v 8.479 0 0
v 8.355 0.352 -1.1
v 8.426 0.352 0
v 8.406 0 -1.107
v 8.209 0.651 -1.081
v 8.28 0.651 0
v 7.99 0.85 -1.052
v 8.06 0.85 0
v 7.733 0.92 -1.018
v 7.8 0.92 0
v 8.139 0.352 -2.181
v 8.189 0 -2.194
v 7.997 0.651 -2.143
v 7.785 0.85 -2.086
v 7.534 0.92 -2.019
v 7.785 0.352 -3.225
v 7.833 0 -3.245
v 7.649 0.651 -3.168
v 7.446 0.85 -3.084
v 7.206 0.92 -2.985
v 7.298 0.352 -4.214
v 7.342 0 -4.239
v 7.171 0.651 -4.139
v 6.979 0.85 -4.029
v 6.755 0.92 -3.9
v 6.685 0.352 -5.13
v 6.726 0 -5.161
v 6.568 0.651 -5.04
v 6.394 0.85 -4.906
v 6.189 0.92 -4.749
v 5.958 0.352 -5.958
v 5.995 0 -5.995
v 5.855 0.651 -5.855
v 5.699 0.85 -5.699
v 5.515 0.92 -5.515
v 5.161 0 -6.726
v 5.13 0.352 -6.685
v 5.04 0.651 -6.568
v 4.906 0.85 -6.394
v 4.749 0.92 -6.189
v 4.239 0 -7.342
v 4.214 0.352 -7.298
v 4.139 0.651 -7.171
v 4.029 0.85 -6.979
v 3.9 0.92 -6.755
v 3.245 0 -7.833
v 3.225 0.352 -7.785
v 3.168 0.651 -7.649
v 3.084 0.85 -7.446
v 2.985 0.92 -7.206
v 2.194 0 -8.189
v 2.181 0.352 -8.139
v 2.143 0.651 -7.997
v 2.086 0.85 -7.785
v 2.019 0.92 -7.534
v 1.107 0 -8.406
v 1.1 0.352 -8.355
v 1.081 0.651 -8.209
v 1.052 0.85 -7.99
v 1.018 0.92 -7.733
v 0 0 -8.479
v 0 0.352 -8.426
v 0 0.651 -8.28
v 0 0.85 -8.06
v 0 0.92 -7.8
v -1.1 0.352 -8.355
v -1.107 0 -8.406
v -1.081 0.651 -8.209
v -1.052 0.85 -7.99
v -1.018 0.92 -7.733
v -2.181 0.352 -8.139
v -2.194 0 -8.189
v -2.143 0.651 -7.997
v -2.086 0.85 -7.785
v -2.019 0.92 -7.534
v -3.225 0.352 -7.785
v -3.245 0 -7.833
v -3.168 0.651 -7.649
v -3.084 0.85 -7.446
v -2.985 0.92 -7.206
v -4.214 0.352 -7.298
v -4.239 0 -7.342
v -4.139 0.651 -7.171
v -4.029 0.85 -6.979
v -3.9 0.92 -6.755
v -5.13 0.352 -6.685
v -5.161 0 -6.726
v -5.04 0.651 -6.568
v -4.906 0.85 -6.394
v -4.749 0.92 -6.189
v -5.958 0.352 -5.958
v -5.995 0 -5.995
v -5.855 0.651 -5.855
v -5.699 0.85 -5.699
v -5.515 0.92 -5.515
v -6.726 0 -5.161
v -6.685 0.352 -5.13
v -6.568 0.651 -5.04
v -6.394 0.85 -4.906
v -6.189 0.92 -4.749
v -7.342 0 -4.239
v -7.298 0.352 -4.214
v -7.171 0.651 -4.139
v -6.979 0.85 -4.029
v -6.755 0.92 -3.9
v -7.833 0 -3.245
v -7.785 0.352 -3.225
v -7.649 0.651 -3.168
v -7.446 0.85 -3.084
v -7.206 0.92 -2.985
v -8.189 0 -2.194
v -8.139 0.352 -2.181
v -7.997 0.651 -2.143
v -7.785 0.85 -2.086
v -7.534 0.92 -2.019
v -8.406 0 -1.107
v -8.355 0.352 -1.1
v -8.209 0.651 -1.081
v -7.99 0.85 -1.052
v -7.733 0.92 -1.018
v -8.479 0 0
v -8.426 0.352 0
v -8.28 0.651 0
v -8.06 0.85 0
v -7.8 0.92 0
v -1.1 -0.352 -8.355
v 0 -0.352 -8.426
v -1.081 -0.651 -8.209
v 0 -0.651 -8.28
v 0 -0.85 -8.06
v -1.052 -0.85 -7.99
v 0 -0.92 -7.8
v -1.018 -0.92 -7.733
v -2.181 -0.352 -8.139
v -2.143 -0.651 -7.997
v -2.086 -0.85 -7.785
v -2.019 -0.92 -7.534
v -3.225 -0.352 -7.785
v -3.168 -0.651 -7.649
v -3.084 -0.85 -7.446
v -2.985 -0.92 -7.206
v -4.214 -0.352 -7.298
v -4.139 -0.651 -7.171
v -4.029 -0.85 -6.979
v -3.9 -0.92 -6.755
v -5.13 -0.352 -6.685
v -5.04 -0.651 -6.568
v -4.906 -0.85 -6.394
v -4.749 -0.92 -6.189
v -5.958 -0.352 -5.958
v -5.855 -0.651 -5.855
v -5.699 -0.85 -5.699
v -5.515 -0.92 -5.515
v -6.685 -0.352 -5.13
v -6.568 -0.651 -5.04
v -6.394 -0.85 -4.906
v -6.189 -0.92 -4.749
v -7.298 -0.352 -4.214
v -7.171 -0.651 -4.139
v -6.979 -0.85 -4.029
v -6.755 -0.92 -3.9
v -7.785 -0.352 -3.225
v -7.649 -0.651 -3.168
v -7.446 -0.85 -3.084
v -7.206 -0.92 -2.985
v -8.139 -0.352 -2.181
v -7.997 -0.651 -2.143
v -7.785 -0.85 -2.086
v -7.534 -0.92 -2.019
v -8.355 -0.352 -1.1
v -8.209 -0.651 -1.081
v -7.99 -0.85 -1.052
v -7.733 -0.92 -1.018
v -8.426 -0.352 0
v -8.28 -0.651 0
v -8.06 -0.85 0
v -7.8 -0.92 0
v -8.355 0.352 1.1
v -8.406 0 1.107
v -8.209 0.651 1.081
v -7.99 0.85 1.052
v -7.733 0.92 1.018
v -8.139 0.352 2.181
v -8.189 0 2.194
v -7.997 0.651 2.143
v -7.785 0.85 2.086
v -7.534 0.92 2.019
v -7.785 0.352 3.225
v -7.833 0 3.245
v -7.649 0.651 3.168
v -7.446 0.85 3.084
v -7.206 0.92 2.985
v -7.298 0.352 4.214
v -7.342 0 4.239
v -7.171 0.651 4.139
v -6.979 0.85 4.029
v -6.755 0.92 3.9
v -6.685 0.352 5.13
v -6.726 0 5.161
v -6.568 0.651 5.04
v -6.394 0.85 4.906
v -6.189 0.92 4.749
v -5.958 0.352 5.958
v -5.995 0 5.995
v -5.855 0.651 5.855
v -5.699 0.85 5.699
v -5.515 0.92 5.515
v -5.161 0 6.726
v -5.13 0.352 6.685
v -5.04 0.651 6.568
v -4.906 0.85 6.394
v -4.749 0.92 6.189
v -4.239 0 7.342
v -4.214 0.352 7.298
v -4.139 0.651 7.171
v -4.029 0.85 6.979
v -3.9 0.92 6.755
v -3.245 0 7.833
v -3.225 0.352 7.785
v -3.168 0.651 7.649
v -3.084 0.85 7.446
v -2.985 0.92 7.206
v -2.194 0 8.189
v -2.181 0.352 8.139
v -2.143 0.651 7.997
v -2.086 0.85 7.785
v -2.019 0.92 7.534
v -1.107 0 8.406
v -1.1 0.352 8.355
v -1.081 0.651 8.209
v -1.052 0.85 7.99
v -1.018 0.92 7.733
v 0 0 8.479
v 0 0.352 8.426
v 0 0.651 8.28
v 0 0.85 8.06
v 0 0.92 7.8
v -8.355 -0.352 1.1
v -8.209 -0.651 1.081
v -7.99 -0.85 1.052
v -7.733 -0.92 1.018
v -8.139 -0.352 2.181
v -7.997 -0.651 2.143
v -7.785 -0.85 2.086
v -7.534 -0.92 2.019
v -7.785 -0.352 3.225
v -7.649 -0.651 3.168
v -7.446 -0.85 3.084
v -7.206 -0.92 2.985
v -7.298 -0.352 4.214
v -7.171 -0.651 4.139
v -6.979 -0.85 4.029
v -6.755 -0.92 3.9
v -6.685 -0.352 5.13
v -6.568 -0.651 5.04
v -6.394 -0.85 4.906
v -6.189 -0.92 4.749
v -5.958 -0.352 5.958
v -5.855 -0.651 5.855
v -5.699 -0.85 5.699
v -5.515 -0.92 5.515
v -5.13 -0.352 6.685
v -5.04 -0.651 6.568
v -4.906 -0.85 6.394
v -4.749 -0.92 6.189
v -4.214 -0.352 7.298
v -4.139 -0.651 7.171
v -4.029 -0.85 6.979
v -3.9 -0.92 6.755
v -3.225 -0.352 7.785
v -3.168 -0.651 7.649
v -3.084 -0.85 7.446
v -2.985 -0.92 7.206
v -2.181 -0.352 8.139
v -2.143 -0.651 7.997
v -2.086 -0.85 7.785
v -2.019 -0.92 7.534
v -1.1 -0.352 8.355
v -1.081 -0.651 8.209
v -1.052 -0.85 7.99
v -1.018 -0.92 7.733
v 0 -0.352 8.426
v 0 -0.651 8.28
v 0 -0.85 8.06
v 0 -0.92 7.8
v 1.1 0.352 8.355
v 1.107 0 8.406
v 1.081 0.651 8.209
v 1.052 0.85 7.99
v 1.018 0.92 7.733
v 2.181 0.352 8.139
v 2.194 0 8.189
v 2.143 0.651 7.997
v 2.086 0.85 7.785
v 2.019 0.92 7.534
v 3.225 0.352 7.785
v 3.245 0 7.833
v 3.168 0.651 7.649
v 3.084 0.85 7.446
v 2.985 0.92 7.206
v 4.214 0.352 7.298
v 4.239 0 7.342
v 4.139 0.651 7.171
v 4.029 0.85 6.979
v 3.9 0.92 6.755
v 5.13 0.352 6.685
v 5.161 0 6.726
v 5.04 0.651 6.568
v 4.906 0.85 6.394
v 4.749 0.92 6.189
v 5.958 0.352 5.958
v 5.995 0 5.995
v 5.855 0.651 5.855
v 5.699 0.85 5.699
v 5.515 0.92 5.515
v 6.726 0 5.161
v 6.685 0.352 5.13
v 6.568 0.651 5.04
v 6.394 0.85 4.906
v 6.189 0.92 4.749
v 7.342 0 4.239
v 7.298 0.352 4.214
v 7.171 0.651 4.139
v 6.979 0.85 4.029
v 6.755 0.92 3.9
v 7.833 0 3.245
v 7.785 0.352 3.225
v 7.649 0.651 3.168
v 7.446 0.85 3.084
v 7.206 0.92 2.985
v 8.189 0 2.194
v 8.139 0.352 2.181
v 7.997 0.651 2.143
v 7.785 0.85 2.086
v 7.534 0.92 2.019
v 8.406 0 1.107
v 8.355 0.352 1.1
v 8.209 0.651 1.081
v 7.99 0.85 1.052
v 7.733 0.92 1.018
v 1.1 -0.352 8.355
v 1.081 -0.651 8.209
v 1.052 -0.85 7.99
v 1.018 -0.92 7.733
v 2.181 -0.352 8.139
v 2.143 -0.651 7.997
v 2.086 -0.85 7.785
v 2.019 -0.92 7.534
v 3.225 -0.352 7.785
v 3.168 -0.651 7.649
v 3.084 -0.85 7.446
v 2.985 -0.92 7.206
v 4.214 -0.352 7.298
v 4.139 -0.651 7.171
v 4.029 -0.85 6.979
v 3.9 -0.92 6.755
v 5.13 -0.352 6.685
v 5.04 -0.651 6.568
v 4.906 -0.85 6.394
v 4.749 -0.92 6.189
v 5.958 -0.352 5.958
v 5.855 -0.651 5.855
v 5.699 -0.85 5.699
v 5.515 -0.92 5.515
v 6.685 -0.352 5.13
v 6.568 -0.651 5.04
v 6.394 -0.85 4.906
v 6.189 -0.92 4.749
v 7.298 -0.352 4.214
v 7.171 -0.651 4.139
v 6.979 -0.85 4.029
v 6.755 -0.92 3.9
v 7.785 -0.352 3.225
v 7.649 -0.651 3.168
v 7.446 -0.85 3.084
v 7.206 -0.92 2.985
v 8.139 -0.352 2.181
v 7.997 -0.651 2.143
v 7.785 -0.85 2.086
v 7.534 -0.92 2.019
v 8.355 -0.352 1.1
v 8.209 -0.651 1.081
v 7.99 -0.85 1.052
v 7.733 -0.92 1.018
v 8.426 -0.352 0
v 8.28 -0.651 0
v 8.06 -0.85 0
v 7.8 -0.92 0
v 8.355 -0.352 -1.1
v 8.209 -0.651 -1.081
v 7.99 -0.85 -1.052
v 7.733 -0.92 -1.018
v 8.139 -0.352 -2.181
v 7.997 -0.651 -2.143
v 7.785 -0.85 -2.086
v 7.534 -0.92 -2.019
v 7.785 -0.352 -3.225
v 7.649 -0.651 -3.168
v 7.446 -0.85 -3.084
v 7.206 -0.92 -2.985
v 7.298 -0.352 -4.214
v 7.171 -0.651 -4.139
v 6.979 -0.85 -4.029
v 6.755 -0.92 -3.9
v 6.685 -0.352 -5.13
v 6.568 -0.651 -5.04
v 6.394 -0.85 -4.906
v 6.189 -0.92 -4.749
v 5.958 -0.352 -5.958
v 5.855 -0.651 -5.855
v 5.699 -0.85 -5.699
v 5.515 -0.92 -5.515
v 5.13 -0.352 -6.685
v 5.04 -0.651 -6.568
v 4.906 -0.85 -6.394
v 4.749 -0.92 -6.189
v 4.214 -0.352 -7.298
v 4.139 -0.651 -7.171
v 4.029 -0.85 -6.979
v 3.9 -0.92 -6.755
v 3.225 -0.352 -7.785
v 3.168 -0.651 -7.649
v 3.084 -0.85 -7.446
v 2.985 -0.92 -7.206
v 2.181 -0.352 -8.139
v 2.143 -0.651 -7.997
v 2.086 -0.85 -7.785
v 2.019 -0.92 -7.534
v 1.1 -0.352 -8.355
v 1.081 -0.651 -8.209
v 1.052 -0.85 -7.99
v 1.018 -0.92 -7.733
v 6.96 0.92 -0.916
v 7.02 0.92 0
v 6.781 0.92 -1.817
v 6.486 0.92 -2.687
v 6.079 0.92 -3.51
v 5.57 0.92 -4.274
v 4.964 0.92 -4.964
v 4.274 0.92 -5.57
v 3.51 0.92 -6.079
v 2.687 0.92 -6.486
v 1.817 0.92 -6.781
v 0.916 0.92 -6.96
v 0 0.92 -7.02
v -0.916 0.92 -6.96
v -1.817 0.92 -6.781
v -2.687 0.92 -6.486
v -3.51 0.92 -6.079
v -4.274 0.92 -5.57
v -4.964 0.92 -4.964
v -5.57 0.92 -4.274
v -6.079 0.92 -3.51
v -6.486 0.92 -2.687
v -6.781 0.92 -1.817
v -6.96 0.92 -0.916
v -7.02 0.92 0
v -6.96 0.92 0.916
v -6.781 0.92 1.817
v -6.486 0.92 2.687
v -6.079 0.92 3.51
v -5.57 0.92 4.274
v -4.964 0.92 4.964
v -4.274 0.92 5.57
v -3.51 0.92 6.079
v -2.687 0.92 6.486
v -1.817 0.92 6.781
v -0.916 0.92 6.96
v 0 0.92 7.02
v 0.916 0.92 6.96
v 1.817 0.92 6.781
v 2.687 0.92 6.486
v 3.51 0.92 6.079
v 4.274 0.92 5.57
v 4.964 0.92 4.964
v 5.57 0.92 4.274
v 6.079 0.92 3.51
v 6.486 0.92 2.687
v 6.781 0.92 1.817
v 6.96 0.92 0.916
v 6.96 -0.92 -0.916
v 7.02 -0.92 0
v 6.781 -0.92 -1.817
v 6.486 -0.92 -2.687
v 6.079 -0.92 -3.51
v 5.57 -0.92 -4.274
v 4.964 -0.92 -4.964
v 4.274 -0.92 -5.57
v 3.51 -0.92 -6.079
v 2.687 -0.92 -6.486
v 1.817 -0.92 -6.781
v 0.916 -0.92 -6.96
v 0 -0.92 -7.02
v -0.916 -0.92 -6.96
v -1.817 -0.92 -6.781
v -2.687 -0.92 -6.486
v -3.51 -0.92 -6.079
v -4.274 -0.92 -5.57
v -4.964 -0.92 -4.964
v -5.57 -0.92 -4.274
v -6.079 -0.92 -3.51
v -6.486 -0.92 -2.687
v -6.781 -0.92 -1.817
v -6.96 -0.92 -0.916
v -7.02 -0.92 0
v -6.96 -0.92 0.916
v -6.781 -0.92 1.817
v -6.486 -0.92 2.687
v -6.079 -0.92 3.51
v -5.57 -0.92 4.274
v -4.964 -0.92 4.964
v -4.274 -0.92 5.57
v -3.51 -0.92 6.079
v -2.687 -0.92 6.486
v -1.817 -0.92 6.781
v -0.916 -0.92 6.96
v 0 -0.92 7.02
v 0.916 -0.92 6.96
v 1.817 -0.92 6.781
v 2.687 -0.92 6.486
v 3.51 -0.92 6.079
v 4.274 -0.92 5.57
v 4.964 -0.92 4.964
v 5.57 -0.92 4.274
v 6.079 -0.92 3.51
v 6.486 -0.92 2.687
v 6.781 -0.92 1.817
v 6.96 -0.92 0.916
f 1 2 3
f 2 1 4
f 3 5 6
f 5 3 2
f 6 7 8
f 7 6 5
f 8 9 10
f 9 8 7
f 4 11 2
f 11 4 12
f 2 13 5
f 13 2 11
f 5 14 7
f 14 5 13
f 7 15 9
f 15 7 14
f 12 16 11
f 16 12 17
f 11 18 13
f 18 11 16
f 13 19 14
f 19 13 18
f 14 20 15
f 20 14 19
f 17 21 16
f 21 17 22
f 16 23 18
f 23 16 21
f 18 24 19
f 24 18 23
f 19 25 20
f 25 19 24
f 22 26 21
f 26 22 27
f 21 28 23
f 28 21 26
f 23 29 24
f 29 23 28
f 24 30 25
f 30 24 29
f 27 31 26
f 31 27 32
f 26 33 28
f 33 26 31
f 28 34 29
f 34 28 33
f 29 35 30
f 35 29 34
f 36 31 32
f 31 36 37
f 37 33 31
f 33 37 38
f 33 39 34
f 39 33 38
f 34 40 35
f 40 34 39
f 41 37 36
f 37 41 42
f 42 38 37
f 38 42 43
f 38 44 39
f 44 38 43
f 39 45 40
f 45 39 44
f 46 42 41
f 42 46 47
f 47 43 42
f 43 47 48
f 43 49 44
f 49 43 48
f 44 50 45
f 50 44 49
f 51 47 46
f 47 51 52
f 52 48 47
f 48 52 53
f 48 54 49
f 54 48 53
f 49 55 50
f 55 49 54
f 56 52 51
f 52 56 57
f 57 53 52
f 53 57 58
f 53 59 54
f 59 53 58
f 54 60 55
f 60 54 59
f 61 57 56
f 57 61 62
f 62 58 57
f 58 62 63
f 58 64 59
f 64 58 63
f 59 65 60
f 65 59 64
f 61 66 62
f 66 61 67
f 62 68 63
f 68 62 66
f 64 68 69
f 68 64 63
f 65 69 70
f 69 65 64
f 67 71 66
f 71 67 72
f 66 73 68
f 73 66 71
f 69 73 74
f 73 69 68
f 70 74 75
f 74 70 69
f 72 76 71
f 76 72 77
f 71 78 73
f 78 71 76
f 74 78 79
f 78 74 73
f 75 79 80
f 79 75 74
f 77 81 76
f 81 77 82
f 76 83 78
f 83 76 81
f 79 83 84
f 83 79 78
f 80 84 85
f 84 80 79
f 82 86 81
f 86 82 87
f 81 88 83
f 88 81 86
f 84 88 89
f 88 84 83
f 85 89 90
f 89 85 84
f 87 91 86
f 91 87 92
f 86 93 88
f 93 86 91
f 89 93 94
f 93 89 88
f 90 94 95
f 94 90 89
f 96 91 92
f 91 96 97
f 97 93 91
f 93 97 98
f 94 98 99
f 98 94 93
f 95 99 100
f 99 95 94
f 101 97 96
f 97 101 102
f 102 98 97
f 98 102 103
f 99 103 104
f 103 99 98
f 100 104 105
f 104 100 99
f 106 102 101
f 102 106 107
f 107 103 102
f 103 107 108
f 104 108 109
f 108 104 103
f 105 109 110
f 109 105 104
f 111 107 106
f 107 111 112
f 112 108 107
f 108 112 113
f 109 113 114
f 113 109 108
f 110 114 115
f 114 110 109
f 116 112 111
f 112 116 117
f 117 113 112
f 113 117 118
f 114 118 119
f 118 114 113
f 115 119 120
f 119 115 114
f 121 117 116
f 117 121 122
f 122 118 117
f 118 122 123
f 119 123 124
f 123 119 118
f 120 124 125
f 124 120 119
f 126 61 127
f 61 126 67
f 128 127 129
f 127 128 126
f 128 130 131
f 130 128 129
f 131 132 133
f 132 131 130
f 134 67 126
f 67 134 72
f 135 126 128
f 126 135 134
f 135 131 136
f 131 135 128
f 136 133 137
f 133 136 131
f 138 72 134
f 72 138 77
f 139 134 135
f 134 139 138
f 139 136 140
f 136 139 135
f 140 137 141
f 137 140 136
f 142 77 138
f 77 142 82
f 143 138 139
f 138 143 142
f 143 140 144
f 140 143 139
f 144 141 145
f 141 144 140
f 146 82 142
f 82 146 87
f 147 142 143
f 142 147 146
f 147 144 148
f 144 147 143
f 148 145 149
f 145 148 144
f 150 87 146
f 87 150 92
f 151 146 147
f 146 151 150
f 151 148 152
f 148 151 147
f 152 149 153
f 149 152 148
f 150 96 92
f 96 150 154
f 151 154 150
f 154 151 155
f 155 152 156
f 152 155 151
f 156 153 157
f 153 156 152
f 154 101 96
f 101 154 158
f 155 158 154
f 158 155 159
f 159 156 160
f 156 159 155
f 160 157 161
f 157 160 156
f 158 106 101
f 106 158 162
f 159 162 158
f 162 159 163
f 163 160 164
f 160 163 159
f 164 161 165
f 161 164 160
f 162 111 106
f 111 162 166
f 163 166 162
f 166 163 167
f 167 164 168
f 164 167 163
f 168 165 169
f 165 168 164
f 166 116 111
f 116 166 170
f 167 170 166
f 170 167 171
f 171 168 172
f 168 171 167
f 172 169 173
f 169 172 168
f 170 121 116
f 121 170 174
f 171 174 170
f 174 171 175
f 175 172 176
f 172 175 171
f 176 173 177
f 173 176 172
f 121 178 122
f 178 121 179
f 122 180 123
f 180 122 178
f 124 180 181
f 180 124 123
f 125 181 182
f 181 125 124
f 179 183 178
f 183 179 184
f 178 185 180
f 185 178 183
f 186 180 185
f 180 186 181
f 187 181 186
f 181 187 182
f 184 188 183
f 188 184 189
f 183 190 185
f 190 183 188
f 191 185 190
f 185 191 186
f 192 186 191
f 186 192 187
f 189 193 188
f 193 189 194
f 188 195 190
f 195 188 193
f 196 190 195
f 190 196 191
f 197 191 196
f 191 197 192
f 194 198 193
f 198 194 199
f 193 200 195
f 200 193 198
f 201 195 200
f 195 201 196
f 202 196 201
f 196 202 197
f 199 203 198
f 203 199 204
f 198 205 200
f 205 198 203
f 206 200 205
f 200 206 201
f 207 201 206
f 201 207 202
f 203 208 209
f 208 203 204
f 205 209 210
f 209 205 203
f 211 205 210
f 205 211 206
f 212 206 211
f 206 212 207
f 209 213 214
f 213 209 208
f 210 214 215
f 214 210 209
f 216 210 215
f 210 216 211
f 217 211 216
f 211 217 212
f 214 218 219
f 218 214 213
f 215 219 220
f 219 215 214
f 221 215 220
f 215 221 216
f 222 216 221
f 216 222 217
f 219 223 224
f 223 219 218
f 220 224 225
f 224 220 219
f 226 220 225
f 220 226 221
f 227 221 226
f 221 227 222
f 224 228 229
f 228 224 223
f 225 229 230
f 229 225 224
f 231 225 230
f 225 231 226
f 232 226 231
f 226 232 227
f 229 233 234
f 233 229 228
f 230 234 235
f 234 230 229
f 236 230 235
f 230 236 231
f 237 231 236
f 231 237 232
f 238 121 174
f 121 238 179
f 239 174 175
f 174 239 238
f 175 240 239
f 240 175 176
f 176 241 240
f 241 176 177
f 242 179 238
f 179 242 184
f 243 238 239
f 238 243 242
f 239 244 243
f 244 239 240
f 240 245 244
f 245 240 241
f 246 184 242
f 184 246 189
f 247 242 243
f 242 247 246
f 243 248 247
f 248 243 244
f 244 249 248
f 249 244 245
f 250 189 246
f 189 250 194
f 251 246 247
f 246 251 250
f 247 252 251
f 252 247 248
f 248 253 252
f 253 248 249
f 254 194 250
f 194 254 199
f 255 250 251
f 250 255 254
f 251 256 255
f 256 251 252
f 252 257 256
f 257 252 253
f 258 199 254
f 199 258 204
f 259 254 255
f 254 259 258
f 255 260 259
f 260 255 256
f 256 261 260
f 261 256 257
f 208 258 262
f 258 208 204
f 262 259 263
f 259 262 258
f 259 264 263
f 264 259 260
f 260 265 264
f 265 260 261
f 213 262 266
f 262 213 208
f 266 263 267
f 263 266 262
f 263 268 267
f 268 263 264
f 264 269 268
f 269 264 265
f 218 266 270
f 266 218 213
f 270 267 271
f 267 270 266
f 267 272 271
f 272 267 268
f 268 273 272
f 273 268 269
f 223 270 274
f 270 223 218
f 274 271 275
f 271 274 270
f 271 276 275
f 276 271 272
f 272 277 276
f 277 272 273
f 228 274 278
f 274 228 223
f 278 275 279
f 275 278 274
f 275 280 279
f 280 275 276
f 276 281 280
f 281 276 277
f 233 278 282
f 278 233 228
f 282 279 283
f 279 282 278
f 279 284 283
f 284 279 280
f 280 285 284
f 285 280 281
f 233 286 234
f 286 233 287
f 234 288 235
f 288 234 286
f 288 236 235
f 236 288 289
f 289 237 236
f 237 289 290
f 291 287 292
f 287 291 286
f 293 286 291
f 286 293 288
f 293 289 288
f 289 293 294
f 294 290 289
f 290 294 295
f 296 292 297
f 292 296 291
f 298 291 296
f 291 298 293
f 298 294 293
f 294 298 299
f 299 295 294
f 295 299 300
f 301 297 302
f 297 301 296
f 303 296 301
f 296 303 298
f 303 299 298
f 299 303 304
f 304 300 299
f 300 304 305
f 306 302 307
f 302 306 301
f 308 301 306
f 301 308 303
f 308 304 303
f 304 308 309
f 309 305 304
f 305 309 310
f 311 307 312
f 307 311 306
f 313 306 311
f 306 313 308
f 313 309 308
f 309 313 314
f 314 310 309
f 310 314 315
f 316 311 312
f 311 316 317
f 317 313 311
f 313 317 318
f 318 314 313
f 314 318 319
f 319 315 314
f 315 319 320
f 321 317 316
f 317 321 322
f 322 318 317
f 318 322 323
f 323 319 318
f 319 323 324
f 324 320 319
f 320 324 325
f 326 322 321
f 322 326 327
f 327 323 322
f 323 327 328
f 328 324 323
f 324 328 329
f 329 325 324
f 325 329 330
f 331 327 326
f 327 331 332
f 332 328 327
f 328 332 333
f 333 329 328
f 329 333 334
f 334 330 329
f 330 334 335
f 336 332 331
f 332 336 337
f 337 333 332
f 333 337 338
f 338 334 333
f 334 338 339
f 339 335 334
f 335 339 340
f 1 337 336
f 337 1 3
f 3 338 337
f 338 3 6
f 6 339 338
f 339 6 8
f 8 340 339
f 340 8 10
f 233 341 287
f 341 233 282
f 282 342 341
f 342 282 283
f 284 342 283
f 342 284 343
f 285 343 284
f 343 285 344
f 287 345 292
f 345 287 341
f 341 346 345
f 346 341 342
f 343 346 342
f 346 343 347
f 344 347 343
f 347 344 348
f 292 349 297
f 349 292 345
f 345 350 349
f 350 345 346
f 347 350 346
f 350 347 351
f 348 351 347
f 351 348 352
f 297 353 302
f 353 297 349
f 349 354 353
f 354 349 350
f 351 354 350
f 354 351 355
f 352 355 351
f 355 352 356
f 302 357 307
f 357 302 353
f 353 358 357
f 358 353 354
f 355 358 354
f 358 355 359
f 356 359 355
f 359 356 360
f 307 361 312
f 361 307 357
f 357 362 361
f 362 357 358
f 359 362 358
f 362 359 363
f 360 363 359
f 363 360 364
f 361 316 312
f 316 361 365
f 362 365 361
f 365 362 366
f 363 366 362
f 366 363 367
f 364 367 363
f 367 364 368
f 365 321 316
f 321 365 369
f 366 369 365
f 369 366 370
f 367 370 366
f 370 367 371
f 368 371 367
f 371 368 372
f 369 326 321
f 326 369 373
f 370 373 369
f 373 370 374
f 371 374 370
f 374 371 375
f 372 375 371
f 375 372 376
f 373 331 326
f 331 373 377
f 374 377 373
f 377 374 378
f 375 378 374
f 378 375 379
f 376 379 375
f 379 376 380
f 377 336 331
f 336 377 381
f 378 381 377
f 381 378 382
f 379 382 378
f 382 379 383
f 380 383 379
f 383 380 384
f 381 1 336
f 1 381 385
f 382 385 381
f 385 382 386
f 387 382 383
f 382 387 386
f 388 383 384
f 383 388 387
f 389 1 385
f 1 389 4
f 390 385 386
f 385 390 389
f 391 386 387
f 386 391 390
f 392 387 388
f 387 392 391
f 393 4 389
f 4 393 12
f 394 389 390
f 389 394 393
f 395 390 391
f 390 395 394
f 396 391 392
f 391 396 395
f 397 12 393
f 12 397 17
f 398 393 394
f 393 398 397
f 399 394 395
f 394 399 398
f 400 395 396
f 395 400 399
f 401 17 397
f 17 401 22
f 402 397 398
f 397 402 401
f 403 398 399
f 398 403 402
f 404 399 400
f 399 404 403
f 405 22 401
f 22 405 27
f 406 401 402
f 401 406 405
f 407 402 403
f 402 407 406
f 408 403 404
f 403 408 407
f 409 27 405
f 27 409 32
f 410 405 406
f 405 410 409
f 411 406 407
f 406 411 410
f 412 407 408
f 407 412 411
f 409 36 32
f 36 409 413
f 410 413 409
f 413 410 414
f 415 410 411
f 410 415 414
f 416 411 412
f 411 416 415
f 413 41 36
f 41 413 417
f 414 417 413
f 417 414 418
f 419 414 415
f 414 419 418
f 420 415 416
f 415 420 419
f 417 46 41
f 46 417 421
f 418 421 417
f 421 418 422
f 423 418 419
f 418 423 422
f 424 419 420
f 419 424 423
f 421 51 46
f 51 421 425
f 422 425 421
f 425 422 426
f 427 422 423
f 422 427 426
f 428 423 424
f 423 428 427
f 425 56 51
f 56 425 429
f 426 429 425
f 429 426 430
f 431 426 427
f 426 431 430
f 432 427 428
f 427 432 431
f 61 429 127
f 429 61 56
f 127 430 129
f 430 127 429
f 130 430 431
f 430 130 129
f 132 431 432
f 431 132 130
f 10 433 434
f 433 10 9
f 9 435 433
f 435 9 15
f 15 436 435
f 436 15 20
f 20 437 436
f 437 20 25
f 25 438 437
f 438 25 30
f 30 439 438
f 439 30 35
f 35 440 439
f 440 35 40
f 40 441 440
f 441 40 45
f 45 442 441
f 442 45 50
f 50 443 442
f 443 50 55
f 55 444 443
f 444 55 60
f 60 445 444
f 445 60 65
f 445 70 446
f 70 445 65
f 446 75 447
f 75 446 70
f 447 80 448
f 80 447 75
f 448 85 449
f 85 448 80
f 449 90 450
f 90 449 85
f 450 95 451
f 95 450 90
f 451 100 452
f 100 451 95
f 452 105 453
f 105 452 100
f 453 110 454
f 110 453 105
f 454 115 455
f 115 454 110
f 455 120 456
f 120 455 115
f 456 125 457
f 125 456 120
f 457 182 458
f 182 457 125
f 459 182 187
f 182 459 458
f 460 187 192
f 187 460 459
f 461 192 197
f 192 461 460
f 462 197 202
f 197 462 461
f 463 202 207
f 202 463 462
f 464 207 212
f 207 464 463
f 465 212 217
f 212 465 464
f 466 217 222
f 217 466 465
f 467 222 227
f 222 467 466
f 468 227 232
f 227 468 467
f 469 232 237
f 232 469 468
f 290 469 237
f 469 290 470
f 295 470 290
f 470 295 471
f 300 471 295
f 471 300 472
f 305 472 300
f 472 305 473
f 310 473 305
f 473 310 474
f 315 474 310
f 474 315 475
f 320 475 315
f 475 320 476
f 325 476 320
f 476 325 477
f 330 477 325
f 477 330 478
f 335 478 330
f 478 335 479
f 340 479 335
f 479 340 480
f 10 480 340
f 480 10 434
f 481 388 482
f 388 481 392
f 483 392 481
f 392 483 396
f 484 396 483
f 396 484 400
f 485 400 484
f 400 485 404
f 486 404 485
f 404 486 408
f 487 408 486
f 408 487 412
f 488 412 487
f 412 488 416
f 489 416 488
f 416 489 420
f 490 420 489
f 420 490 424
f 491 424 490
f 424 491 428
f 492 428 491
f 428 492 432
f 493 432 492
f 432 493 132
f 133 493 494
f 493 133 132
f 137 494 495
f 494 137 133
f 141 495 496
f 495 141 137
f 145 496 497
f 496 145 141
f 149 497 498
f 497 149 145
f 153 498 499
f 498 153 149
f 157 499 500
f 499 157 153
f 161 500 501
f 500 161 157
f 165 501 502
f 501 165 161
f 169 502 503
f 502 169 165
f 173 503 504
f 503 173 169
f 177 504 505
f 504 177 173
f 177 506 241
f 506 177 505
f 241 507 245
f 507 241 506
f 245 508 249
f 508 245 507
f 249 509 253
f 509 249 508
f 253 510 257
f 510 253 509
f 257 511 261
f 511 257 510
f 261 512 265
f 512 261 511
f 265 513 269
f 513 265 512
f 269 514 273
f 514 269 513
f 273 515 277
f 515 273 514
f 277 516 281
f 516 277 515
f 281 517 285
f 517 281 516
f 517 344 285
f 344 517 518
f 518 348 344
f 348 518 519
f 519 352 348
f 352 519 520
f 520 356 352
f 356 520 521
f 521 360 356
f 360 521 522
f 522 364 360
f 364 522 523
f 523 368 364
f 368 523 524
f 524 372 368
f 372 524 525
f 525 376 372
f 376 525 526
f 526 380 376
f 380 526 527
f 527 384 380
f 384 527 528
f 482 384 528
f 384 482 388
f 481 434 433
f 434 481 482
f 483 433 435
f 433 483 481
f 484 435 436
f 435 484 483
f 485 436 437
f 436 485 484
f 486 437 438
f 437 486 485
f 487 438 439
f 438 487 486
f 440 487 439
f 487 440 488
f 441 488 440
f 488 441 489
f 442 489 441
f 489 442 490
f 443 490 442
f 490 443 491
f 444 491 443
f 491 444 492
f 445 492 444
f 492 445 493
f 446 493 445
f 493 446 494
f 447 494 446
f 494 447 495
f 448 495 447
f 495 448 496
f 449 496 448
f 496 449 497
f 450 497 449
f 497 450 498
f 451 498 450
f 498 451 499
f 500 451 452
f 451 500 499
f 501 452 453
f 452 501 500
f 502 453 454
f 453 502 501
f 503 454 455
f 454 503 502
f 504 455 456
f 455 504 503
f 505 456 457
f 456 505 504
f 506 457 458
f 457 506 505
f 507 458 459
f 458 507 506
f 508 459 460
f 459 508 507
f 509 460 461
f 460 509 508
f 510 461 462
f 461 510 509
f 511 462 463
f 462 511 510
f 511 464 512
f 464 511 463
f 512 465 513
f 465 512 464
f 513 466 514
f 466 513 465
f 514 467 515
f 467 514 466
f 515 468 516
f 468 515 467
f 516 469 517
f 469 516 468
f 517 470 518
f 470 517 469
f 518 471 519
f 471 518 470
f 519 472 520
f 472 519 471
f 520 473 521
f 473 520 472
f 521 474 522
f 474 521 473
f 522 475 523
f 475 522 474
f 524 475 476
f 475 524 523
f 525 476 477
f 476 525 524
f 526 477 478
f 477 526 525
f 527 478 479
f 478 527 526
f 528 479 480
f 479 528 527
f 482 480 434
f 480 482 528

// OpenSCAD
// file: ../../p/48/1-4edge.scad
use <../../lib.scad>
function ldraw_lib__48__1_4edge() = [
// 0 Hi-Res Circle 0.25
// 0 Name: 48\1-4edge.dat
// 0 Author: Manfred Moolhuysen
// 0 !LDRAW_ORG 48_Primitive UPDATE 2010-02
// 0 !LICENSE Licensed under CC BY 2.0 and CC BY 4.0 : see CAreadme.txt
// 
// 0 BFC CERTIFY CCW
  [0,"BFC","CERTIFY"],
  [0,"BFC","CCW"],
// 
// 0 !HISTORY 1999-07-05 [PTadmin] Official Update 1999-05
// 0 !HISTORY 2007-06-24 [PTadmin] Header formatted for Contributor Agreement
// 0 !HISTORY 2008-07-01 [PTadmin] Official Update 2008-01
// 0 !HISTORY 2010-03-17 [MagFors] Updated description
// 0 !HISTORY 2010-05-21 [mikeheide] BFC'ed and compacted numbers (saved 10% filesize)
// 0 !HISTORY 2010-07-05 [PTadmin] Official Update 2010-02
// 
// 
// 2 24 1 0 0 0.9914 0 0.1305
  [2,24,1,0,0,0.9914,0,0.1305],
// 2 24 0.9914 0 0.1305 0.9659 0 0.2588
  [2,24,0.9914,0,0.1305,0.9659,0,0.2588],
// 2 24 0.9659 0 0.2588 0.9239 0 0.3827
  [2,24,0.9659,0,0.2588,0.9239,0,0.3827],
// 2 24 0.9239 0 0.3827 0.866 0 0.5
  [2,24,0.9239,0,0.3827,0.866,0,0.5],
// 2 24 0.866 0 0.5 0.7934 0 0.6088
  [2,24,0.866,0,0.5,0.7934,0,0.6088],
// 2 24 0.7934 0 0.6088 0.7071 0 0.7071
  [2,24,0.7934,0,0.6088,0.7071,0,0.7071],
// 2 24 0.7071 0 0.7071 0.6088 0 0.7934
  [2,24,0.7071,0,0.7071,0.6088,0,0.7934],
// 2 24 0.6088 0 0.7934 0.5 0 0.866
  [2,24,0.6088,0,0.7934,0.5,0,0.866],
// 2 24 0.5 0 0.866 0.3827 0 0.9239
  [2,24,0.5,0,0.866,0.3827,0,0.9239],
// 2 24 0.3827 0 0.9239 0.2588 0 0.9659
  [2,24,0.3827,0,0.9239,0.2588,0,0.9659],
// 2 24 0.2588 0 0.9659 0.1305 0 0.9914
  [2,24,0.2588,0,0.9659,0.1305,0,0.9914],
// 2 24 0.1305 0 0.9914 0 0 1
  [2,24,0.1305,0,0.9914,0,0,1],
// 0 //
];
makepoly(ldraw_lib__48__1_4edge(), line=0.2);
// file: ../../p/48/1-4cyli.scad
use <../../lib.scad>
function ldraw_lib__48__1_4cyli() = [
// 0 Hi-Res Cylinder 0.25
// 0 Name: 48\1-4cyli.dat
// 0 Author: Manfred Moolhuysen
// 0 !LDRAW_ORG 48_Primitive UPDATE 2009-01
// 0 !LICENSE Licensed under CC BY 2.0 and CC BY 4.0 : see CAreadme.txt
// 
// 0 BFC CERTIFY CCW
  [0,"BFC","CERTIFY"],
  [0,"BFC","CCW"],
// 
// 0 !HISTORY 1999-07-05 [PTadmin] Official Update 1999-05
// 0 !HISTORY 2002-02-28 [hafhead] Added BFC statement
// 0 !HISTORY 2002-04-25 [PTadmin] Official Update 2002-02
// 0 !HISTORY 2007-06-24 [PTadmin] Header formatted for Contributor Agreement
// 0 !HISTORY 2008-07-01 [PTadmin] Official Update 2008-01
// 0 !HISTORY 2008-07-07 [guyvivan] Made BFC'ed CCW (2005-12-06)
// 0 !HISTORY 2009-05-02 [PTadmin] Official Update 2009-01
// 
// 
// 4 16 0.9914 0 0.1305 1 0 0 1 1 0 0.9914 1 0.1305
  [4,16,0.9914,0,0.1305,1,0,0,1,1,0,0.9914,1,0.1305],
// 4 16 0.9659 0 0.2588 0.9914 0 0.1305 0.9914 1 0.1305 0.9659 1 0.2588
  [4,16,0.9659,0,0.2588,0.9914,0,0.1305,0.9914,1,0.1305,0.9659,1,0.2588],
// 4 16 0.9239 0 0.3827 0.9659 0 0.2588 0.9659 1 0.2588 0.9239 1 0.3827
  [4,16,0.9239,0,0.3827,0.9659,0,0.2588,0.9659,1,0.2588,0.9239,1,0.3827],
// 4 16 0.866 0 0.5 0.9239 0 0.3827 0.9239 1 0.3827 0.866 1 0.5
  [4,16,0.866,0,0.5,0.9239,0,0.3827,0.9239,1,0.3827,0.866,1,0.5],
// 4 16 0.7934 0 0.6088 0.866 0 0.5 0.866 1 0.5 0.7934 1 0.6088
  [4,16,0.7934,0,0.6088,0.866,0,0.5,0.866,1,0.5,0.7934,1,0.6088],
// 4 16 0.7071 0 0.7071 0.7934 0 0.6088 0.7934 1 0.6088 0.7071 1 0.7071
  [4,16,0.7071,0,0.7071,0.7934,0,0.6088,0.7934,1,0.6088,0.7071,1,0.7071],
// 4 16 0.6088 0 0.7934 0.7071 0 0.7071 0.7071 1 0.7071 0.6088 1 0.7934
  [4,16,0.6088,0,0.7934,0.7071,0,0.7071,0.7071,1,0.7071,0.6088,1,0.7934],
// 4 16 0.5 0 0.866 0.6088 0 0.7934 0.6088 1 0.7934 0.5 1 0.866
  [4,16,0.5,0,0.866,0.6088,0,0.7934,0.6088,1,0.7934,0.5,1,0.866],
// 4 16 0.3827 0 0.9239 0.5 0 0.866 0.5 1 0.866 0.3827 1 0.9239
  [4,16,0.3827,0,0.9239,0.5,0,0.866,0.5,1,0.866,0.3827,1,0.9239],
// 4 16 0.2588 0 0.9659 0.3827 0 0.9239 0.3827 1 0.9239 0.2588 1 0.9659
  [4,16,0.2588,0,0.9659,0.3827,0,0.9239,0.3827,1,0.9239,0.2588,1,0.9659],
// 4 16 0.1305 0 0.9914 0.2588 0 0.9659 0.2588 1 0.9659 0.1305 1 0.9914
  [4,16,0.1305,0,0.9914,0.2588,0,0.9659,0.2588,1,0.9659,0.1305,1,0.9914],
// 4 16 0 0 1 0.1305 0 0.9914 0.1305 1 0.9914 0 1 1
  [4,16,0,0,1,0.1305,0,0.9914,0.1305,1,0.9914,0,1,1],
// 
// 0 conditional lines
// 5 24 1 1 0 1 0 0 1 1 -1 0.9914 1 0.1305
  [5,24,1,1,0,1,0,0,1,1,-1,0.9914,1,0.1305],
// 5 24 0.9914 1 0.1305 0.9914 0 0.1305 1 1 0 0.9659 1 0.2588
  [5,24,0.9914,1,0.1305,0.9914,0,0.1305,1,1,0,0.9659,1,0.2588],
// 5 24 0.9659 1 0.2588 0.9659 0 0.2588 0.9914 1 0.1305 0.9239 1 0.3827
  [5,24,0.9659,1,0.2588,0.9659,0,0.2588,0.9914,1,0.1305,0.9239,1,0.3827],
// 5 24 0.9239 1 0.3827 0.9239 0 0.3827 0.9659 1 0.2588 0.866 1 0.5
  [5,24,0.9239,1,0.3827,0.9239,0,0.3827,0.9659,1,0.2588,0.866,1,0.5],
// 5 24 0.866 1 0.5 0.866 0 0.5 0.9239 1 0.3827 0.7934 1 0.6088
  [5,24,0.866,1,0.5,0.866,0,0.5,0.9239,1,0.3827,0.7934,1,0.6088],
// 5 24 0.7934 1 0.6088 0.7934 0 0.6088 0.866 1 0.5 0.7071 1 0.7071
  [5,24,0.7934,1,0.6088,0.7934,0,0.6088,0.866,1,0.5,0.7071,1,0.7071],
// 5 24 0.7071 1 0.7071 0.7071 0 0.7071 0.7934 1 0.6088 0.6088 1 0.7934
  [5,24,0.7071,1,0.7071,0.7071,0,0.7071,0.7934,1,0.6088,0.6088,1,0.7934],
// 5 24 0.6088 1 0.7934 0.6088 0 0.7934 0.7071 1 0.7071 0.5 1 0.866
  [5,24,0.6088,1,0.7934,0.6088,0,0.7934,0.7071,1,0.7071,0.5,1,0.866],
// 5 24 0.5 1 0.866 0.5 0 0.866 0.6088 1 0.7934 0.3827 1 0.9239
  [5,24,0.5,1,0.866,0.5,0,0.866,0.6088,1,0.7934,0.3827,1,0.9239],
// 5 24 0.3827 1 0.9239 0.3827 0 0.9239 0.5 1 0.866 0.2588 1 0.9659
  [5,24,0.3827,1,0.9239,0.3827,0,0.9239,0.5,1,0.866,0.2588,1,0.9659],
// 5 24 0.2588 1 0.9659 0.2588 0 0.9659 0.3827 1 0.9239 0.1305 1 0.9914
  [5,24,0.2588,1,0.9659,0.2588,0,0.9659,0.3827,1,0.9239,0.1305,1,0.9914],
// 5 24 0.1305 1 0.9914 0.1305 0 0.9914 0.2588 1 0.9659 0 1 1
  [5,24,0.1305,1,0.9914,0.1305,0,0.9914,0.2588,1,0.9659,0,1,1],
// 5 24 0 1 1 0 0 1 0.1305 1 0.9914 -1 1 1
  [5,24,0,1,1,0,0,1,0.1305,1,0.9914,-1,1,1],
// 
// 0 end of file
];
makepoly(ldraw_lib__48__1_4cyli(), line=0.2);
// file: ../../p/48/1-4ring9.scad
use <../../lib.scad>
function ldraw_lib__48__1_4ring9() = [
// 0 Hi-Res Ring  9 x 0.25
// 0 Name: 48\1-4ring9.dat
// 0 Author: Paul Easter [pneaster]
// 0 !LDRAW_ORG 48_Primitive UPDATE 2014-02
// 0 !LICENSE Licensed under CC BY 2.0 and CC BY 4.0 : see CAreadme.txt
// 
// 0 BFC CERTIFY CCW
  [0,"BFC","CERTIFY"],
  [0,"BFC","CCW"],
// 
// 0 !HISTORY 2002-08-18 [PTadmin] Official Update 2002-04
// 0 !HISTORY 2007-06-24 [PTadmin] Header formatted for Contributor Agreement
// 0 !HISTORY 2008-07-01 [PTadmin] Official Update 2008-01
// 0 !HISTORY 2012-02-27 [Philo] Changed to CCW
// 0 !HISTORY 2012-08-09 [PTadmin] Official Update 2012-02
// 0 !HISTORY 2014-12-20 [MMR1988] Fixed a rounding issue
// 0 !HISTORY 2014-12-23 [PTadmin] Official Update 2014-02
// 
// 
// 4 16 10 0 0 9.914 0 1.305 8.9226 0 1.1745 9 0 0
  [4,16,10,0,0,9.914,0,1.305,8.9226,0,1.1745,9,0,0],
// 4 16 9.914 0 1.305 9.659 0 2.588 8.6931 0 2.3292 8.9226 0 1.1745
  [4,16,9.914,0,1.305,9.659,0,2.588,8.6931,0,2.3292,8.9226,0,1.1745],
// 4 16 9.659 0 2.588 9.239 0 3.827 8.3151 0 3.4443 8.6931 0 2.3292
  [4,16,9.659,0,2.588,9.239,0,3.827,8.3151,0,3.4443,8.6931,0,2.3292],
// 4 16 9.239 0 3.827 8.66 0 5 7.794 0 4.5 8.3151 0 3.4443
  [4,16,9.239,0,3.827,8.66,0,5,7.794,0,4.5,8.3151,0,3.4443],
// 4 16 8.66 0 5 7.934 0 6.088 7.1406 0 5.4792 7.794 0 4.5
  [4,16,8.66,0,5,7.934,0,6.088,7.1406,0,5.4792,7.794,0,4.5],
// 4 16 7.934 0 6.088 7.071 0 7.071 6.3639 0 6.3639 7.1406 0 5.4792
  [4,16,7.934,0,6.088,7.071,0,7.071,6.3639,0,6.3639,7.1406,0,5.4792],
// 4 16 7.071 0 7.071 6.088 0 7.934 5.4792 0 7.1406 6.3639 0 6.3639
  [4,16,7.071,0,7.071,6.088,0,7.934,5.4792,0,7.1406,6.3639,0,6.3639],
// 4 16 6.088 0 7.934 5 0 8.66 4.5 0 7.794 5.4792 0 7.1406
  [4,16,6.088,0,7.934,5,0,8.66,4.5,0,7.794,5.4792,0,7.1406],
// 4 16 5 0 8.66 3.827 0 9.239 3.4443 0 8.3151 4.5 0 7.794
  [4,16,5,0,8.66,3.827,0,9.239,3.4443,0,8.3151,4.5,0,7.794],
// 4 16 3.827 0 9.239 2.588 0 9.659 2.3292 0 8.6931 3.4443 0 8.3151
  [4,16,3.827,0,9.239,2.588,0,9.659,2.3292,0,8.6931,3.4443,0,8.3151],
// 4 16 2.588 0 9.659 1.305 0 9.914 1.1745 0 8.9226 2.3292 0 8.6931
  [4,16,2.588,0,9.659,1.305,0,9.914,1.1745,0,8.9226,2.3292,0,8.6931],
// 4 16 1.305 0 9.914 0 0 10 0 0 9 1.1745 0 8.9226
  [4,16,1.305,0,9.914,0,0,10,0,0,9,1.1745,0,8.9226],
// 0 // Build by Primitive Generator 2
];
makepoly(ldraw_lib__48__1_4ring9(), line=0.2);
// file: ../../p/48/4-4edge.scad
use <../../lib.scad>
use <1-4edge.scad>
function ldraw_lib__48__4_4edge() = [
// 0 Hi-Res Circle 1.0
// 0 Name: 48\4-4edge.dat
// 0 Author: Paul Easter [pneaster]
// 0 !LDRAW_ORG 48_Primitive UPDATE 2012-01
// 0 !LICENSE Licensed under CC BY 2.0 and CC BY 4.0 : see CAreadme.txt
// 
// 0 BFC CERTIFY CCW
  [0,"BFC","CERTIFY"],
  [0,"BFC","CCW"],
// 
// 0 !HISTORY 2002-08-18 [PTadmin] Official Update 2002-04
// 0 !HISTORY 2007-06-24 [PTadmin] Header formatted for Contributor Agreement
// 0 !HISTORY 2008-07-01 [PTadmin] Official Update 2008-01
// 0 !HISTORY 2012-01-15 [MagFors] BFC'ed, title changed from Edge to Circle
// 0 !HISTORY 2012-03-30 [PTadmin] Official Update 2012-01
// 
// 
// 1 16 0 0 0 1 0 0 0 1 0 0 0 1 48\1-4edge.dat
  [1,16,0,0,0,1,0,0,0,1,0,0,0,1, ldraw_lib__48__1_4edge()],
// 1 16 0 0 0 0 0 -1 0 1 0 1 0 0 48\1-4edge.dat
  [1,16,0,0,0,0,0,-1,0,1,0,1,0,0, ldraw_lib__48__1_4edge()],
// 1 16 0 0 0 -1 0 0 0 1 0 0 0 -1 48\1-4edge.dat
  [1,16,0,0,0,-1,0,0,0,1,0,0,0,-1, ldraw_lib__48__1_4edge()],
// 1 16 0 0 0 0 0 1 0 1 0 -1 0 0 48\1-4edge.dat
  [1,16,0,0,0,0,0,1,0,1,0,-1,0,0, ldraw_lib__48__1_4edge()],
// 
];
makepoly(ldraw_lib__48__4_4edge(), line=0.2);
// file: ../../p/48/4-4cyli.scad
use <../../lib.scad>
use <1-4cyli.scad>
function ldraw_lib__48__4_4cyli() = [
// 0 Hi-Res Cylinder 1.0
// 0 Name: 48\4-4cyli.dat
// 0 Author: Paul Easter [pneaster]
// 0 !LDRAW_ORG 48_Primitive UPDATE 2012-02
// 0 !LICENSE Licensed under CC BY 2.0 and CC BY 4.0 : see CAreadme.txt
// 
// 0 BFC CERTIFY CCW
  [0,"BFC","CERTIFY"],
  [0,"BFC","CCW"],
// 
// 0 !HISTORY 2002-08-18 [PTadmin] Official Update 2002-04
// 0 !HISTORY 2007-06-24 [PTadmin] Header formatted for Contributor Agreement
// 0 !HISTORY 2008-07-01 [PTadmin] Official Update 2008-01
// 0 !HISTORY 2012-02-27 [Philo] Changed to CCW
// 0 !HISTORY 2012-08-09 [PTadmin] Official Update 2012-02
// 
// 
// 1 16 0 0 0 1 0 0 0 1 0 0 0 1 48\1-4cyli.dat
  [1,16,0,0,0,1,0,0,0,1,0,0,0,1, ldraw_lib__48__1_4cyli()],
// 1 16 0 0 0 0 0 -1 0 1 0 1 0 0 48\1-4cyli.dat
  [1,16,0,0,0,0,0,-1,0,1,0,1,0,0, ldraw_lib__48__1_4cyli()],
// 1 16 0 0 0 -1 0 0 0 1 0 0 0 -1 48\1-4cyli.dat
  [1,16,0,0,0,-1,0,0,0,1,0,0,0,-1, ldraw_lib__48__1_4cyli()],
// 1 16 0 0 0 0 0 1 0 1 0 -1 0 0 48\1-4cyli.dat
  [1,16,0,0,0,0,0,1,0,1,0,-1,0,0, ldraw_lib__48__1_4cyli()],
];
makepoly(ldraw_lib__48__4_4cyli(), line=0.2);
// file: ../../p/48/4-4ring9.scad
use <../../lib.scad>
use <1-4ring9.scad>
function ldraw_lib__48__4_4ring9() = [
// 0 Hi-Res Ring  9 x 1.0
// 0 Name: 48\4-4ring9.dat
// 0 Author: Paul Easter [pneaster]
// 0 !LDRAW_ORG 48_Primitive UPDATE 2012-02
// 0 !LICENSE Licensed under CC BY 2.0 and CC BY 4.0 : see CAreadme.txt
// 
// 0 BFC CERTIFY CCW
  [0,"BFC","CERTIFY"],
  [0,"BFC","CCW"],
// 
// 0 !HISTORY 2002-08-18 [PTadmin] Official Update 2002-04
// 0 !HISTORY 2007-06-24 [PTadmin] Header formatted for Contributor Agreement
// 0 !HISTORY 2008-07-01 [PTadmin] Official Update 2008-01
// 0 !HISTORY 2012-02-27 [Philo] Changed to CCW
// 0 !HISTORY 2012-08-09 [PTadmin] Official Update 2012-02
// 
// 
// 1 16 0 0 0 1 0 0 0 1 0 0 0 1 48\1-4ring9.dat
  [1,16,0,0,0,1,0,0,0,1,0,0,0,1, ldraw_lib__48__1_4ring9()],
// 1 16 0 0 0 0 0 -1 0 1 0 1 0 0 48\1-4ring9.dat
  [1,16,0,0,0,0,0,-1,0,1,0,1,0,0, ldraw_lib__48__1_4ring9()],
// 1 16 0 0 0 -1 0 0 0 1 0 0 0 -1 48\1-4ring9.dat
  [1,16,0,0,0,-1,0,0,0,1,0,0,0,-1, ldraw_lib__48__1_4ring9()],
// 1 16 0 0 0 0 0 1 0 1 0 -1 0 0 48\1-4ring9.dat
  [1,16,0,0,0,0,0,1,0,1,0,-1,0,0, ldraw_lib__48__1_4ring9()],
];
makepoly(ldraw_lib__48__4_4ring9(), line=0.2);
// file: ../../p/48/4-4cylo.scad
use <../../lib.scad>
use <4-4cyli.scad>
use <4-4edge.scad>
function ldraw_lib__48__4_4cylo() = [
// 0 Hi-Res Cylinder Open 1.0
// 0 Name: 48\4-4cylo.dat
// 0 Author: Philippe Hurbain [Philo]
// 0 !LDRAW_ORG 48_Primitive UPDATE 2011-01
// 0 !LICENSE Licensed under CC BY 2.0 and CC BY 4.0 : see CAreadme.txt
// 
// 0 BFC CERTIFY CCW
  [0,"BFC","CERTIFY"],
  [0,"BFC","CCW"],
// 
// 0 !HISTORY 2011-07-25 [PTadmin] Official Update 2011-01
// 
// 
// 1 16 0 0 0 1 0 0 0 1 0 0 0 1 48\4-4edge.dat
  [1,16,0,0,0,1,0,0,0,1,0,0,0,1, ldraw_lib__48__4_4edge()],
// 1 16 0 1 0 1 0 0 0 1 0 0 0 1 48\4-4edge.dat
  [1,16,0,1,0,1,0,0,0,1,0,0,0,1, ldraw_lib__48__4_4edge()],
// 1 16 0 0 0 1 0 0 0 1 0 0 0 1 48\4-4cyli.dat
  [1,16,0,0,0,1,0,0,0,1,0,0,0,1, ldraw_lib__48__4_4cyli()],
];
makepoly(ldraw_lib__48__4_4cylo(), line=0.2);
// main file
use <../../lib.scad>
use <../../p/48/4-4cylo.scad>
use <../../p/48/4-4ring9.scad>
use <../../p/48/tm04o0870.scad>
function ldraw_lib__s__92851s02() = [
// 0 ~Wheel Minifig Bicycle Integral Tyre
// 0 Name: s\92851s02.dat
// 0 Author: Philippe Hurbain [Philo]
// 0 !LDRAW_ORG Subpart UPDATE 2018-02
// 0 !LICENSE Licensed under CC BY 2.0 and CC BY 4.0 : see CAreadme.txt
// 
// 0 BFC CERTIFY CCW
  [0,"BFC","CERTIFY"],
  [0,"BFC","CCW"],
// 
// 0 !HISTORY 2018-12-08 [PTadmin] Official Update 2018-02
// 
// 
// 1 16 0 0 0 19.5 0 0 0 0 19.5 0 26.45 0 48\tm04o0870.dat
  [1,16,0,0,0,19.5,0,0,0,0,19.5,0,26.45,0, ldraw_lib__48__tm04o0870()],
// 1 16 0 0 0 0 0 -19.5 19.5 0 0 0 26.45 0 48\tm04o0870.dat
  [1,16,0,0,0,0,0,-19.5,19.5,0,0,0,26.45,0, ldraw_lib__48__tm04o0870()],
// 1 16 0 0 0 0 0 -19.5 19.5 0 0 0 -26.45 0 48\tm04o0870.dat
  [1,16,0,0,0,0,0,-19.5,19.5,0,0,0,-26.45,0, ldraw_lib__48__tm04o0870()],
// 1 16 0 0 0 -19.5 0 0 0 0 -19.5 0 26.45 0 48\tm04o0870.dat
  [1,16,0,0,0,-19.5,0,0,0,0,-19.5,0,26.45,0, ldraw_lib__48__tm04o0870()],
// 1 16 0 0 0 -19.5 0 0 0 0 -19.5 0 -26.45 0 48\tm04o0870.dat
  [1,16,0,0,0,-19.5,0,0,0,0,-19.5,0,-26.45,0, ldraw_lib__48__tm04o0870()],
// 1 16 0 0 0 0 0 19.5 -19.5 0 0 0 26.45 0 48\tm04o0870.dat
  [1,16,0,0,0,0,0,19.5,-19.5,0,0,0,26.45,0, ldraw_lib__48__tm04o0870()],
// 1 16 0 0 0 0 0 19.5 -19.5 0 0 0 -26.45 0 48\tm04o0870.dat
  [1,16,0,0,0,0,0,19.5,-19.5,0,0,0,-26.45,0, ldraw_lib__48__tm04o0870()],
// 1 16 0 0 0 19.5 0 0 0 0 19.5 0 -26.45 0 48\tm04o0870.dat
  [1,16,0,0,0,19.5,0,0,0,0,19.5,0,-26.45,0, ldraw_lib__48__tm04o0870()],
// 1 16 0 0 2.3 1.95 0 0 0 0 1.95 0 -1 0 48\4-4ring9.dat
  [1,16,0,0,2.3,1.95,0,0,0,0,1.95,0,-1,0, ldraw_lib__48__4_4ring9()],
// 1 16 0 0 -2.3 1.95 0 0 0 0 1.95 0 1 0 48\4-4ring9.dat
  [1,16,0,0,-2.3,1.95,0,0,0,0,1.95,0,1,0, ldraw_lib__48__4_4ring9()],
// 0 BFC INVERTNEXT
  [0,"BFC","INVERTNEXT"],
// 1 16 0 0 2.3 17.55 0 0 0 0 17.55 0 -4.6 0 48\4-4cylo.dat
  [1,16,0,0,2.3,17.55,0,0,0,0,17.55,0,-4.6,0, ldraw_lib__48__4_4cylo()],
];
makepoly(ldraw_lib__s__92851s02(), line=0.2);
